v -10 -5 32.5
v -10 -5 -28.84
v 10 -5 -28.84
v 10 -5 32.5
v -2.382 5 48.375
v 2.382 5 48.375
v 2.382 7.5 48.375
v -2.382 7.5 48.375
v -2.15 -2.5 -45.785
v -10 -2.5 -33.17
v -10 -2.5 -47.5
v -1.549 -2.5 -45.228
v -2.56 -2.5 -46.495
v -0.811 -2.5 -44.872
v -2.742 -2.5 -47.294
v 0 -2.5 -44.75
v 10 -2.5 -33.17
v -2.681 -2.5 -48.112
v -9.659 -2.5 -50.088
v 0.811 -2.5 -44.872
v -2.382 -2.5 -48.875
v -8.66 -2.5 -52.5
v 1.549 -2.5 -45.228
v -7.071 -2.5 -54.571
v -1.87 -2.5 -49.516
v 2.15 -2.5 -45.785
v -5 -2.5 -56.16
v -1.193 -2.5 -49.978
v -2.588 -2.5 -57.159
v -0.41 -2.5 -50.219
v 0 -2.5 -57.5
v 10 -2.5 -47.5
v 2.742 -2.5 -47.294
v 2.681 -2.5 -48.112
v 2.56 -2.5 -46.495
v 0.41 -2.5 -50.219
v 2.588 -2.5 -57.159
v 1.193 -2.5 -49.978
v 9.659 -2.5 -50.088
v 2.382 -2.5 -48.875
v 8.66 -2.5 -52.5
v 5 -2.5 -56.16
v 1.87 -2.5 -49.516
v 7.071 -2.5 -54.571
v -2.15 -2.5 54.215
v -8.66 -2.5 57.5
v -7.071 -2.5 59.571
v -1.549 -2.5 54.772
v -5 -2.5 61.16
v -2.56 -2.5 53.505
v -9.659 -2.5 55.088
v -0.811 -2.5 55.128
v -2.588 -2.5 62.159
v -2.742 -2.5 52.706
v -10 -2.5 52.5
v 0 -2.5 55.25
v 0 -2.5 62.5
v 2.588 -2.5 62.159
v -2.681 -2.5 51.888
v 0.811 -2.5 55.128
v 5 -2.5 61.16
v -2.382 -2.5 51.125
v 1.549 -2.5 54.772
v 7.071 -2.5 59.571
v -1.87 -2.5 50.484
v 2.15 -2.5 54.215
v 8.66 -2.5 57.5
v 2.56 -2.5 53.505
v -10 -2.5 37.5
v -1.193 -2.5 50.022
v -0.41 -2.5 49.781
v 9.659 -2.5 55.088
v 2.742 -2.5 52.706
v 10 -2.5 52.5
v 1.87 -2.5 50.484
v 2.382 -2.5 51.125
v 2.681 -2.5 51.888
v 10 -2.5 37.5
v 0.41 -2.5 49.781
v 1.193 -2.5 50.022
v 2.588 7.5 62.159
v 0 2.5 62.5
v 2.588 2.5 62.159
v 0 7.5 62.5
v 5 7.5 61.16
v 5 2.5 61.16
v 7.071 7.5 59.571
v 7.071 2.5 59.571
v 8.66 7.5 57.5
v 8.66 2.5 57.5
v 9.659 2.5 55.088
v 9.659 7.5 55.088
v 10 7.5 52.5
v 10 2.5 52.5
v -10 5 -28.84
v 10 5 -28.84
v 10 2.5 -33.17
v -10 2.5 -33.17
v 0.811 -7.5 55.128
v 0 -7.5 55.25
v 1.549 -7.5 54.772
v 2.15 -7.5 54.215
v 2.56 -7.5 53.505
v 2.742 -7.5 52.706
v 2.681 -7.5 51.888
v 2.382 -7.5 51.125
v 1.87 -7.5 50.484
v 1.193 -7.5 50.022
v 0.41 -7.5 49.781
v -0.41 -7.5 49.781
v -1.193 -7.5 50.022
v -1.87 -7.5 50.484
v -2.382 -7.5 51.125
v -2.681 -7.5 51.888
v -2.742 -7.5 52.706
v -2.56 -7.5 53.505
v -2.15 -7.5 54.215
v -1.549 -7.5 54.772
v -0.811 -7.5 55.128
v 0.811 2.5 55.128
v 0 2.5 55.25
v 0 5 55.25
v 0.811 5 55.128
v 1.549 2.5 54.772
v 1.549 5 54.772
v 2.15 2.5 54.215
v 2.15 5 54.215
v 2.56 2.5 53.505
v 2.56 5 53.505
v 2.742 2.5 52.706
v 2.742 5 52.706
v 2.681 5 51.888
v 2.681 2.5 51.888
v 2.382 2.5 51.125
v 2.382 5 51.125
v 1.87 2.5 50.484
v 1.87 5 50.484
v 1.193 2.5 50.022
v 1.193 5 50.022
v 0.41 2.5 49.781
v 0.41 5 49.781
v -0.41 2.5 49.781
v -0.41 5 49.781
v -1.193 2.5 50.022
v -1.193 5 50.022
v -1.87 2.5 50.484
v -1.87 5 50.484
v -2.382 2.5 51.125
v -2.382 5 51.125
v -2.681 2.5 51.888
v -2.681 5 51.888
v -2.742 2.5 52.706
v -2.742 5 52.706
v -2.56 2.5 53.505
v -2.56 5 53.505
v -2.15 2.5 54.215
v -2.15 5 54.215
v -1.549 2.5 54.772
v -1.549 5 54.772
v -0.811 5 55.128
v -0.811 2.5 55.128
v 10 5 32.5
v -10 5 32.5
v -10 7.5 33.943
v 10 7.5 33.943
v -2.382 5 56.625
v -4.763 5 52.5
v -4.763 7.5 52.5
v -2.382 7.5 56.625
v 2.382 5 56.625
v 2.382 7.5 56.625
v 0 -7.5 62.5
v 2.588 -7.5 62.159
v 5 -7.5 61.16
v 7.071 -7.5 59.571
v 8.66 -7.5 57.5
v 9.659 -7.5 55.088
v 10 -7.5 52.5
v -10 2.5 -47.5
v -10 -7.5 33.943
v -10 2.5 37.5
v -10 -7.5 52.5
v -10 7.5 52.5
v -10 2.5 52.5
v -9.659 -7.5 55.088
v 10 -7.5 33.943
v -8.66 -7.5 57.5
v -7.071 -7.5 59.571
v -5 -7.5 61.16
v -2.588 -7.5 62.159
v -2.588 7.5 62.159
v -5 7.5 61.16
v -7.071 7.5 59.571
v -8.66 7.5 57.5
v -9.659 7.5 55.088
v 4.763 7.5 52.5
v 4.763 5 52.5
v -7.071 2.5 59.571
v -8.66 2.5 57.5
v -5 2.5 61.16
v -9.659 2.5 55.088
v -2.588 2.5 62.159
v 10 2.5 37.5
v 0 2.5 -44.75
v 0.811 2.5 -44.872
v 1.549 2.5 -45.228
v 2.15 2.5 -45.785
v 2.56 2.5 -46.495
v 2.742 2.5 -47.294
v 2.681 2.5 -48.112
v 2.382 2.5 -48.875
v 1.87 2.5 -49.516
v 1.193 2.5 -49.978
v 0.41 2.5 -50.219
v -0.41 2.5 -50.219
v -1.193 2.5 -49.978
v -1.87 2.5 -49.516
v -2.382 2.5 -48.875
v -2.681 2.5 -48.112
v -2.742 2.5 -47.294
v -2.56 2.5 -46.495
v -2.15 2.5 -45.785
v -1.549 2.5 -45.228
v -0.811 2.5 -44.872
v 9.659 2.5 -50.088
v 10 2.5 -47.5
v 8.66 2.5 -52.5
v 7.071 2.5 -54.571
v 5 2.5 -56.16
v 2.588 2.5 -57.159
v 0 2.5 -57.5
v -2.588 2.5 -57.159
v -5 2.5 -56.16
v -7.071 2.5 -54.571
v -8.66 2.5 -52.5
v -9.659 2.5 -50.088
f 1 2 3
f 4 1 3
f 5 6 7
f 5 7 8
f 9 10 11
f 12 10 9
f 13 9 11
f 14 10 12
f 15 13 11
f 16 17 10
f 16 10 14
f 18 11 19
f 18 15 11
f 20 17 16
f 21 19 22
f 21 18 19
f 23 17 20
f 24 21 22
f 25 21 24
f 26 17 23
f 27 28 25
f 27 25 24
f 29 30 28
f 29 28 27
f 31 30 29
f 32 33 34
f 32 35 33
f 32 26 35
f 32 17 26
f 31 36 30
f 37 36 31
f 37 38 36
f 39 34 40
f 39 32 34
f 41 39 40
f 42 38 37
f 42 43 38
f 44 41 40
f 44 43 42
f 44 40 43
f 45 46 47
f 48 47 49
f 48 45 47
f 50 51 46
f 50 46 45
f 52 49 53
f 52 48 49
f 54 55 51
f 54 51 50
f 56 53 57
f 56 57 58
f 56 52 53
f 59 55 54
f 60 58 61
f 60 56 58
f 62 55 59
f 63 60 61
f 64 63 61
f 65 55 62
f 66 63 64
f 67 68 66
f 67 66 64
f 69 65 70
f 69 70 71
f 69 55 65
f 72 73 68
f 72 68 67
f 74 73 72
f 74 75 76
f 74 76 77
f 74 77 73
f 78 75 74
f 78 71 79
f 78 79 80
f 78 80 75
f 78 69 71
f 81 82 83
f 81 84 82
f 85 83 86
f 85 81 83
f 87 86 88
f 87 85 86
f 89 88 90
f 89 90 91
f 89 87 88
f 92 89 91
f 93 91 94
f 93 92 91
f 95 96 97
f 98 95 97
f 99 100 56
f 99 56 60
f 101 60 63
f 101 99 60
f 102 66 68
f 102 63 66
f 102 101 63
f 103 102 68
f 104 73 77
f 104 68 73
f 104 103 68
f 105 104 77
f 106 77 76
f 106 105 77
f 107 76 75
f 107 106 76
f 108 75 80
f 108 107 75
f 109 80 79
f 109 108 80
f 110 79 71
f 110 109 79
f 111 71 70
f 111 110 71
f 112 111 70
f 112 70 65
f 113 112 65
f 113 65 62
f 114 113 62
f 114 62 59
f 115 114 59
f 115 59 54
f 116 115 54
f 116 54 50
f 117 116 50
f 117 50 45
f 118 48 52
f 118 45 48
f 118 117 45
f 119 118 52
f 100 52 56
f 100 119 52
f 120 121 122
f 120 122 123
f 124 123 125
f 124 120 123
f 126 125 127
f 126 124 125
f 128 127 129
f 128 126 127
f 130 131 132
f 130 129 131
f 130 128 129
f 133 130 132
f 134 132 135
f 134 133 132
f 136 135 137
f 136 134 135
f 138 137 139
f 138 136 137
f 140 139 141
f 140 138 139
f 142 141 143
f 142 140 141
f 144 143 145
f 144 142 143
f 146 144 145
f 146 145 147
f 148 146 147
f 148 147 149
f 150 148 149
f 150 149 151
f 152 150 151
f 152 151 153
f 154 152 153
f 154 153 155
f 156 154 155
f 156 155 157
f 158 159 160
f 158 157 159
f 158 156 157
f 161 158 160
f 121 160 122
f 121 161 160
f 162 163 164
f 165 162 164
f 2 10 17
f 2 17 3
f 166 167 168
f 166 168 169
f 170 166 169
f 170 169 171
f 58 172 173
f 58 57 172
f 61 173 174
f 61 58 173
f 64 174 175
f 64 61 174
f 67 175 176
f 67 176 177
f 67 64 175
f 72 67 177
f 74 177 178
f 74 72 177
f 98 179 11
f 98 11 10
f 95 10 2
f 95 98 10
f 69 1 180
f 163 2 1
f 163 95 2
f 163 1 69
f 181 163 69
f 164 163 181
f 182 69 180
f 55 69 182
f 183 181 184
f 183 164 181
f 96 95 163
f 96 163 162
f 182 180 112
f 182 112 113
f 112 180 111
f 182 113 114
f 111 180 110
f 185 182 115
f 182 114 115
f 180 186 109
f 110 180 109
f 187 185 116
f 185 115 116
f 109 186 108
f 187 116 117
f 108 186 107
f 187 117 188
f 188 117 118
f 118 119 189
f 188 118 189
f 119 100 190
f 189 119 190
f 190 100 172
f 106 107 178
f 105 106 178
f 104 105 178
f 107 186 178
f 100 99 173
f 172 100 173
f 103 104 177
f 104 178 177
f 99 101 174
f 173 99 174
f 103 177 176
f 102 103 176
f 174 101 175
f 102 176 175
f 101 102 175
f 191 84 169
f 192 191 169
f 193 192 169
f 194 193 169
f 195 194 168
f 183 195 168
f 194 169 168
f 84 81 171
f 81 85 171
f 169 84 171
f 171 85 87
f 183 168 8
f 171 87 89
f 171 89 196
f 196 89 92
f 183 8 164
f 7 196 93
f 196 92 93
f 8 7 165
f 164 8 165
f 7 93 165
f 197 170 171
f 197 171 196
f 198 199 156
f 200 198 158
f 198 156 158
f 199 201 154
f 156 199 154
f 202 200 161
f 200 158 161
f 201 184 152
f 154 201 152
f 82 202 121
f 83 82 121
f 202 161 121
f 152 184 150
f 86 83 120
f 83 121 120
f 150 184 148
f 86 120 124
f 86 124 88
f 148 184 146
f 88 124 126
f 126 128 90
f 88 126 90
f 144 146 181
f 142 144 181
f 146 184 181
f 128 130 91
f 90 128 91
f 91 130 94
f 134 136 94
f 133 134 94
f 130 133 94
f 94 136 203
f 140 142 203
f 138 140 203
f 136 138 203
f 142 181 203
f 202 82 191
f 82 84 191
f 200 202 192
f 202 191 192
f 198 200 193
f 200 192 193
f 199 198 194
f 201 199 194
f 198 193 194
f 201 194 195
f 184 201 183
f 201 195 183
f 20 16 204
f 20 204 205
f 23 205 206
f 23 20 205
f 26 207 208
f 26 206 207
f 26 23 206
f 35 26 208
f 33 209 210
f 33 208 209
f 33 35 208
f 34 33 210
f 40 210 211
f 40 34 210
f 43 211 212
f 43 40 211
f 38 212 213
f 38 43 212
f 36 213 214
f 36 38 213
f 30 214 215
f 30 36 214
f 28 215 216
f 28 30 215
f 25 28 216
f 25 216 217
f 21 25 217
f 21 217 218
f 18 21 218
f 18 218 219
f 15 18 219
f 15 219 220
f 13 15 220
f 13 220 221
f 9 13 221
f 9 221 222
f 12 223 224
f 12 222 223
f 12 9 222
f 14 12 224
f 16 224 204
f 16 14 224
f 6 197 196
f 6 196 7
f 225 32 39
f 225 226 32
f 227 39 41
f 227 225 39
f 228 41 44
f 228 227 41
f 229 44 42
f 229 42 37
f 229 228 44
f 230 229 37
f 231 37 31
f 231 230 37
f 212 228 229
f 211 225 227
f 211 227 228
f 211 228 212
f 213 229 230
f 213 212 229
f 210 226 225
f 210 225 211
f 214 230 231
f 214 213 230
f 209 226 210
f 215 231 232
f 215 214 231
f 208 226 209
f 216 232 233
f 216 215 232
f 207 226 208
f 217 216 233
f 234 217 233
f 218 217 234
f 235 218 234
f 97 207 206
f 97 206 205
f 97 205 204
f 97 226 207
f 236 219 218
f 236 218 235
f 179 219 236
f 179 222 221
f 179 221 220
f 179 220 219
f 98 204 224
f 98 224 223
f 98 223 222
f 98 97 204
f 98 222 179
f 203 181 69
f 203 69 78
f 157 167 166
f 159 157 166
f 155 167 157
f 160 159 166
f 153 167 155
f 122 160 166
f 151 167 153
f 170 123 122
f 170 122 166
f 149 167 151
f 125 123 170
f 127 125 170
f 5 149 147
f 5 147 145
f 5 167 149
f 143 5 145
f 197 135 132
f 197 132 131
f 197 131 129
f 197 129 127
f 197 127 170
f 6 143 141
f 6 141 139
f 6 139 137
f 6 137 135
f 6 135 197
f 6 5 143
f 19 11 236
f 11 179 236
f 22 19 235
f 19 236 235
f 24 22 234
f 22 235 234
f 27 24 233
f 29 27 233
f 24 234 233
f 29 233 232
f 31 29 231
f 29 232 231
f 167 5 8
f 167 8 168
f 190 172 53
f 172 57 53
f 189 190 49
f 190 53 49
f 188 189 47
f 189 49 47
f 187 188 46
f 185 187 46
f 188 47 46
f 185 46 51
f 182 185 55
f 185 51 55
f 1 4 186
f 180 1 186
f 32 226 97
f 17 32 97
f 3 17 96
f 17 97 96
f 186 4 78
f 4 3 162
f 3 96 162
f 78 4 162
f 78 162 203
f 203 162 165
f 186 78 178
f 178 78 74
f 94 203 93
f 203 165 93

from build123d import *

# Parameters (mm, degrees)
BOSS_EXTRUDE1_DEPTH      = 37.5
BOSS_EXTRUDE1_DEPTH_BACK = 37.5
SKETCH1_W                = 20
SKETCH1_H                = 10
SKETCH3_W                = 20
SKETCH3_H                = 5
BOSS_EXTRUDE2_DEPTH      = 20
FILLET1_R                = 10
SKETCH5_W                = 20
SKETCH5_H                = 5
BOSS_EXTRUDE3_DEPTH      = 25
CHAMFER1_SIZE            = 5
CHAMFER1_SIZE_2          = 8.660254038
FILLET2_R                = 10
CUT_EXTRUDE1_DEPTH       = 65.08002809
CUT_EXTRUDE1_DEPTH_BACK  = 65.08002809
SKETCH4_R                = 2.75
CUT_EXTRUDE2_DEPTH       = 66.048059156
CUT_EXTRUDE2_DEPTH_BACK  = 2.5


# Some blends are built 0.0001 mm under size
with BuildPart() as part:
    # Sketch1 → Boss-Extrude1 (new, two sides: drawn at the far end of the back side and taken through both)
    with BuildSketch(Plane.XY.offset(-BOSS_EXTRUDE1_DEPTH_BACK)):
        Rectangle(SKETCH1_W, SKETCH1_H)
    extrude(amount=BOSS_EXTRUDE1_DEPTH + BOSS_EXTRUDE1_DEPTH_BACK)

    # Sketch3 → Boss-Extrude2 (add)
    with BuildSketch(Plane(origin=(0, 0, -37.5), x_dir=(-1, 0, 0), z_dir=(0, 0, -1))):
        Rectangle(SKETCH3_W, SKETCH3_H)
    extrude(amount=BOSS_EXTRUDE2_DEPTH)

    # Fillet1
    fillet1_edges = [part.edges().sort_by_distance(p)[0] for p in [
        (-10, 0, -57.5),
        (10, 0, -57.5),
    ]]
    fillet(fillet1_edges, radius=FILLET1_R - 0.0001)  # a hair under: the kernel refuses the full size

    # Sketch5 → Boss-Extrude3 (add)
    with BuildSketch(Plane.XY.offset(37.5)):
        with Locations((0, 5)):
            Rectangle(SKETCH5_W, SKETCH5_H)
        with Locations((0, -5)):
            Rectangle(SKETCH5_W, SKETCH5_H)
    extrude(amount=BOSS_EXTRUDE3_DEPTH)

    # Chamfer1
    # the kernel refuses this chamfer: 8.660254038, 5 mm, written as the material it adds along each edge
    with BuildSketch(Plane(origin=(10, 5, 37.5), x_dir=(0, -0.05789386240267149, -0.9983227437537926), z_dir=(-1, 0, 0))) as chamfer1_piece_1_section:
        Polygon((CHAMFER1_SIZE * 0.998322743754, -CHAMFER1_SIZE * 0.0578938624027), (-CHAMFER1_SIZE_2 * 0.0578938624016, -CHAMFER1_SIZE_2 * 0.998322743736), (0, 0), align=None)
    chamfer1_piece_1 = extrude(amount=20, mode=Mode.PRIVATE)
    chamfer1_piece_1 = split(chamfer1_piece_1, bisect_by=Plane(origin=(0, 7.5, 35.327003025), z_dir=(0, -1, 0)), keep=Keep.TOP, mode=Mode.PRIVATE)
    add(chamfer1_piece_1)
    with BuildSketch(Plane(origin=(-10, -5, 37.5), x_dir=(0, 0.05789386240267149, -0.9983227437537926), z_dir=(1, 0, 0))) as chamfer1_piece_2_section:
        Polygon((CHAMFER1_SIZE * 0.998322743754, -CHAMFER1_SIZE * 0.0578938624027), (-CHAMFER1_SIZE_2 * 0.0578938624016, -CHAMFER1_SIZE_2 * 0.998322743736), (0, 0), align=None)
    chamfer1_piece_2 = extrude(amount=20, mode=Mode.PRIVATE)
    chamfer1_piece_2 = split(chamfer1_piece_2, bisect_by=Plane(origin=(0, -7.5, 35.327003025), z_dir=(0, 1, 0)), keep=Keep.TOP, mode=Mode.PRIVATE)
    add(chamfer1_piece_2)
    # the kernel refuses this chamfer: 8.660254038, 5 mm, written as the material it takes off along each edge
    with BuildSketch(Plane(origin=(32.404819853, 5, -37.5), x_dir=(0, 0.019326765612700598, 0.9998132206222078), z_dir=(-1, 0, 0))) as chamfer1_2_piece_1_section:
        Polygon((CHAMFER1_SIZE_2 * 0.999813220604, -CHAMFER1_SIZE_2 * 0.0193267656124), (-CHAMFER1_SIZE * 0.0193267656127, -CHAMFER1_SIZE * 0.999813220622), (0, 0), align=None)
    chamfer1_2_piece_1 = extrude(amount=64.809639706, mode=Mode.PRIVATE)
    chamfer1_2_piece_1 = split(chamfer1_2_piece_1, bisect_by=Plane(origin=(0, 2.5, -34.039331058), z_dir=(0, 1, 0)), keep=Keep.TOP, mode=Mode.PRIVATE)
    add(chamfer1_2_piece_1, mode=Mode.SUBTRACT)
    with BuildSketch(Plane(origin=(-32.404819853, -5, -37.5), x_dir=(0, 0.9983227437537926, -0.057893862402671824), z_dir=(1, 0, 0))) as chamfer1_2_piece_2_section:
        Polygon((CHAMFER1_SIZE * 0.998322743754, CHAMFER1_SIZE * 0.0578938624027), (-CHAMFER1_SIZE_2 * 0.0578938624016, CHAMFER1_SIZE_2 * 0.998322743736), (0, 0), align=None)
    chamfer1_2_piece_2 = extrude(amount=64.809639706, mode=Mode.PRIVATE)
    chamfer1_2_piece_2 = split(chamfer1_2_piece_2, bisect_by=Plane(origin=(0, -2.5, -34.039331058), z_dir=(0, -1, 0)), keep=Keep.TOP, mode=Mode.PRIVATE)
    add(chamfer1_2_piece_2, mode=Mode.SUBTRACT)

    # Fillet2
    fillet2_edges = [part.edges().sort_by_distance(p)[0] for p in [
        (-10, -5, 62.5),
        (-10, 5, 62.5),
        (10, -5, 62.5),
        (10, 5, 62.5),
    ]]
    fillet(fillet2_edges, radius=FILLET2_R - 0.0001)  # a hair under: the kernel refuses the full size

    # Sketch4 → Cut-Extrude1 (cut, two sides: drawn at the far end of the back side and taken through both)
    with BuildSketch(Plane(origin=(0, 2.5, 0), x_dir=(1, 0, 0), z_dir=(0, 1, 0)).offset(-CUT_EXTRUDE1_DEPTH_BACK)):
        with Locations(Location((0, 47.5, 0), (0, 0, 270))):
            Circle(SKETCH4_R)
        with Locations(Location((0, -52.5, 0), (0, 0, 270))):
            Circle(SKETCH4_R)
    extrude(amount=CUT_EXTRUDE1_DEPTH + CUT_EXTRUDE1_DEPTH_BACK, mode=Mode.SUBTRACT)

    # Sketch6 → Cut-Extrude2 (cut, two sides: drawn at the far end of the back side and taken through both)
    with BuildSketch(Plane(origin=(0, 7.5, 0), x_dir=(1, 0, 0), z_dir=(0, 1, 0)).offset(-CUT_EXTRUDE2_DEPTH_BACK)):
        Polygon((-2.38156986, -48.375), (-4.763139721, -52.5), (-2.38156986, -56.625), (2.38156986, -56.625), (4.763139721, -52.5), (2.38156986, -48.375), align=None)
    extrude(amount=CUT_EXTRUDE2_DEPTH + CUT_EXTRUDE2_DEPTH_BACK, mode=Mode.SUBTRACT)


solid = part.part
